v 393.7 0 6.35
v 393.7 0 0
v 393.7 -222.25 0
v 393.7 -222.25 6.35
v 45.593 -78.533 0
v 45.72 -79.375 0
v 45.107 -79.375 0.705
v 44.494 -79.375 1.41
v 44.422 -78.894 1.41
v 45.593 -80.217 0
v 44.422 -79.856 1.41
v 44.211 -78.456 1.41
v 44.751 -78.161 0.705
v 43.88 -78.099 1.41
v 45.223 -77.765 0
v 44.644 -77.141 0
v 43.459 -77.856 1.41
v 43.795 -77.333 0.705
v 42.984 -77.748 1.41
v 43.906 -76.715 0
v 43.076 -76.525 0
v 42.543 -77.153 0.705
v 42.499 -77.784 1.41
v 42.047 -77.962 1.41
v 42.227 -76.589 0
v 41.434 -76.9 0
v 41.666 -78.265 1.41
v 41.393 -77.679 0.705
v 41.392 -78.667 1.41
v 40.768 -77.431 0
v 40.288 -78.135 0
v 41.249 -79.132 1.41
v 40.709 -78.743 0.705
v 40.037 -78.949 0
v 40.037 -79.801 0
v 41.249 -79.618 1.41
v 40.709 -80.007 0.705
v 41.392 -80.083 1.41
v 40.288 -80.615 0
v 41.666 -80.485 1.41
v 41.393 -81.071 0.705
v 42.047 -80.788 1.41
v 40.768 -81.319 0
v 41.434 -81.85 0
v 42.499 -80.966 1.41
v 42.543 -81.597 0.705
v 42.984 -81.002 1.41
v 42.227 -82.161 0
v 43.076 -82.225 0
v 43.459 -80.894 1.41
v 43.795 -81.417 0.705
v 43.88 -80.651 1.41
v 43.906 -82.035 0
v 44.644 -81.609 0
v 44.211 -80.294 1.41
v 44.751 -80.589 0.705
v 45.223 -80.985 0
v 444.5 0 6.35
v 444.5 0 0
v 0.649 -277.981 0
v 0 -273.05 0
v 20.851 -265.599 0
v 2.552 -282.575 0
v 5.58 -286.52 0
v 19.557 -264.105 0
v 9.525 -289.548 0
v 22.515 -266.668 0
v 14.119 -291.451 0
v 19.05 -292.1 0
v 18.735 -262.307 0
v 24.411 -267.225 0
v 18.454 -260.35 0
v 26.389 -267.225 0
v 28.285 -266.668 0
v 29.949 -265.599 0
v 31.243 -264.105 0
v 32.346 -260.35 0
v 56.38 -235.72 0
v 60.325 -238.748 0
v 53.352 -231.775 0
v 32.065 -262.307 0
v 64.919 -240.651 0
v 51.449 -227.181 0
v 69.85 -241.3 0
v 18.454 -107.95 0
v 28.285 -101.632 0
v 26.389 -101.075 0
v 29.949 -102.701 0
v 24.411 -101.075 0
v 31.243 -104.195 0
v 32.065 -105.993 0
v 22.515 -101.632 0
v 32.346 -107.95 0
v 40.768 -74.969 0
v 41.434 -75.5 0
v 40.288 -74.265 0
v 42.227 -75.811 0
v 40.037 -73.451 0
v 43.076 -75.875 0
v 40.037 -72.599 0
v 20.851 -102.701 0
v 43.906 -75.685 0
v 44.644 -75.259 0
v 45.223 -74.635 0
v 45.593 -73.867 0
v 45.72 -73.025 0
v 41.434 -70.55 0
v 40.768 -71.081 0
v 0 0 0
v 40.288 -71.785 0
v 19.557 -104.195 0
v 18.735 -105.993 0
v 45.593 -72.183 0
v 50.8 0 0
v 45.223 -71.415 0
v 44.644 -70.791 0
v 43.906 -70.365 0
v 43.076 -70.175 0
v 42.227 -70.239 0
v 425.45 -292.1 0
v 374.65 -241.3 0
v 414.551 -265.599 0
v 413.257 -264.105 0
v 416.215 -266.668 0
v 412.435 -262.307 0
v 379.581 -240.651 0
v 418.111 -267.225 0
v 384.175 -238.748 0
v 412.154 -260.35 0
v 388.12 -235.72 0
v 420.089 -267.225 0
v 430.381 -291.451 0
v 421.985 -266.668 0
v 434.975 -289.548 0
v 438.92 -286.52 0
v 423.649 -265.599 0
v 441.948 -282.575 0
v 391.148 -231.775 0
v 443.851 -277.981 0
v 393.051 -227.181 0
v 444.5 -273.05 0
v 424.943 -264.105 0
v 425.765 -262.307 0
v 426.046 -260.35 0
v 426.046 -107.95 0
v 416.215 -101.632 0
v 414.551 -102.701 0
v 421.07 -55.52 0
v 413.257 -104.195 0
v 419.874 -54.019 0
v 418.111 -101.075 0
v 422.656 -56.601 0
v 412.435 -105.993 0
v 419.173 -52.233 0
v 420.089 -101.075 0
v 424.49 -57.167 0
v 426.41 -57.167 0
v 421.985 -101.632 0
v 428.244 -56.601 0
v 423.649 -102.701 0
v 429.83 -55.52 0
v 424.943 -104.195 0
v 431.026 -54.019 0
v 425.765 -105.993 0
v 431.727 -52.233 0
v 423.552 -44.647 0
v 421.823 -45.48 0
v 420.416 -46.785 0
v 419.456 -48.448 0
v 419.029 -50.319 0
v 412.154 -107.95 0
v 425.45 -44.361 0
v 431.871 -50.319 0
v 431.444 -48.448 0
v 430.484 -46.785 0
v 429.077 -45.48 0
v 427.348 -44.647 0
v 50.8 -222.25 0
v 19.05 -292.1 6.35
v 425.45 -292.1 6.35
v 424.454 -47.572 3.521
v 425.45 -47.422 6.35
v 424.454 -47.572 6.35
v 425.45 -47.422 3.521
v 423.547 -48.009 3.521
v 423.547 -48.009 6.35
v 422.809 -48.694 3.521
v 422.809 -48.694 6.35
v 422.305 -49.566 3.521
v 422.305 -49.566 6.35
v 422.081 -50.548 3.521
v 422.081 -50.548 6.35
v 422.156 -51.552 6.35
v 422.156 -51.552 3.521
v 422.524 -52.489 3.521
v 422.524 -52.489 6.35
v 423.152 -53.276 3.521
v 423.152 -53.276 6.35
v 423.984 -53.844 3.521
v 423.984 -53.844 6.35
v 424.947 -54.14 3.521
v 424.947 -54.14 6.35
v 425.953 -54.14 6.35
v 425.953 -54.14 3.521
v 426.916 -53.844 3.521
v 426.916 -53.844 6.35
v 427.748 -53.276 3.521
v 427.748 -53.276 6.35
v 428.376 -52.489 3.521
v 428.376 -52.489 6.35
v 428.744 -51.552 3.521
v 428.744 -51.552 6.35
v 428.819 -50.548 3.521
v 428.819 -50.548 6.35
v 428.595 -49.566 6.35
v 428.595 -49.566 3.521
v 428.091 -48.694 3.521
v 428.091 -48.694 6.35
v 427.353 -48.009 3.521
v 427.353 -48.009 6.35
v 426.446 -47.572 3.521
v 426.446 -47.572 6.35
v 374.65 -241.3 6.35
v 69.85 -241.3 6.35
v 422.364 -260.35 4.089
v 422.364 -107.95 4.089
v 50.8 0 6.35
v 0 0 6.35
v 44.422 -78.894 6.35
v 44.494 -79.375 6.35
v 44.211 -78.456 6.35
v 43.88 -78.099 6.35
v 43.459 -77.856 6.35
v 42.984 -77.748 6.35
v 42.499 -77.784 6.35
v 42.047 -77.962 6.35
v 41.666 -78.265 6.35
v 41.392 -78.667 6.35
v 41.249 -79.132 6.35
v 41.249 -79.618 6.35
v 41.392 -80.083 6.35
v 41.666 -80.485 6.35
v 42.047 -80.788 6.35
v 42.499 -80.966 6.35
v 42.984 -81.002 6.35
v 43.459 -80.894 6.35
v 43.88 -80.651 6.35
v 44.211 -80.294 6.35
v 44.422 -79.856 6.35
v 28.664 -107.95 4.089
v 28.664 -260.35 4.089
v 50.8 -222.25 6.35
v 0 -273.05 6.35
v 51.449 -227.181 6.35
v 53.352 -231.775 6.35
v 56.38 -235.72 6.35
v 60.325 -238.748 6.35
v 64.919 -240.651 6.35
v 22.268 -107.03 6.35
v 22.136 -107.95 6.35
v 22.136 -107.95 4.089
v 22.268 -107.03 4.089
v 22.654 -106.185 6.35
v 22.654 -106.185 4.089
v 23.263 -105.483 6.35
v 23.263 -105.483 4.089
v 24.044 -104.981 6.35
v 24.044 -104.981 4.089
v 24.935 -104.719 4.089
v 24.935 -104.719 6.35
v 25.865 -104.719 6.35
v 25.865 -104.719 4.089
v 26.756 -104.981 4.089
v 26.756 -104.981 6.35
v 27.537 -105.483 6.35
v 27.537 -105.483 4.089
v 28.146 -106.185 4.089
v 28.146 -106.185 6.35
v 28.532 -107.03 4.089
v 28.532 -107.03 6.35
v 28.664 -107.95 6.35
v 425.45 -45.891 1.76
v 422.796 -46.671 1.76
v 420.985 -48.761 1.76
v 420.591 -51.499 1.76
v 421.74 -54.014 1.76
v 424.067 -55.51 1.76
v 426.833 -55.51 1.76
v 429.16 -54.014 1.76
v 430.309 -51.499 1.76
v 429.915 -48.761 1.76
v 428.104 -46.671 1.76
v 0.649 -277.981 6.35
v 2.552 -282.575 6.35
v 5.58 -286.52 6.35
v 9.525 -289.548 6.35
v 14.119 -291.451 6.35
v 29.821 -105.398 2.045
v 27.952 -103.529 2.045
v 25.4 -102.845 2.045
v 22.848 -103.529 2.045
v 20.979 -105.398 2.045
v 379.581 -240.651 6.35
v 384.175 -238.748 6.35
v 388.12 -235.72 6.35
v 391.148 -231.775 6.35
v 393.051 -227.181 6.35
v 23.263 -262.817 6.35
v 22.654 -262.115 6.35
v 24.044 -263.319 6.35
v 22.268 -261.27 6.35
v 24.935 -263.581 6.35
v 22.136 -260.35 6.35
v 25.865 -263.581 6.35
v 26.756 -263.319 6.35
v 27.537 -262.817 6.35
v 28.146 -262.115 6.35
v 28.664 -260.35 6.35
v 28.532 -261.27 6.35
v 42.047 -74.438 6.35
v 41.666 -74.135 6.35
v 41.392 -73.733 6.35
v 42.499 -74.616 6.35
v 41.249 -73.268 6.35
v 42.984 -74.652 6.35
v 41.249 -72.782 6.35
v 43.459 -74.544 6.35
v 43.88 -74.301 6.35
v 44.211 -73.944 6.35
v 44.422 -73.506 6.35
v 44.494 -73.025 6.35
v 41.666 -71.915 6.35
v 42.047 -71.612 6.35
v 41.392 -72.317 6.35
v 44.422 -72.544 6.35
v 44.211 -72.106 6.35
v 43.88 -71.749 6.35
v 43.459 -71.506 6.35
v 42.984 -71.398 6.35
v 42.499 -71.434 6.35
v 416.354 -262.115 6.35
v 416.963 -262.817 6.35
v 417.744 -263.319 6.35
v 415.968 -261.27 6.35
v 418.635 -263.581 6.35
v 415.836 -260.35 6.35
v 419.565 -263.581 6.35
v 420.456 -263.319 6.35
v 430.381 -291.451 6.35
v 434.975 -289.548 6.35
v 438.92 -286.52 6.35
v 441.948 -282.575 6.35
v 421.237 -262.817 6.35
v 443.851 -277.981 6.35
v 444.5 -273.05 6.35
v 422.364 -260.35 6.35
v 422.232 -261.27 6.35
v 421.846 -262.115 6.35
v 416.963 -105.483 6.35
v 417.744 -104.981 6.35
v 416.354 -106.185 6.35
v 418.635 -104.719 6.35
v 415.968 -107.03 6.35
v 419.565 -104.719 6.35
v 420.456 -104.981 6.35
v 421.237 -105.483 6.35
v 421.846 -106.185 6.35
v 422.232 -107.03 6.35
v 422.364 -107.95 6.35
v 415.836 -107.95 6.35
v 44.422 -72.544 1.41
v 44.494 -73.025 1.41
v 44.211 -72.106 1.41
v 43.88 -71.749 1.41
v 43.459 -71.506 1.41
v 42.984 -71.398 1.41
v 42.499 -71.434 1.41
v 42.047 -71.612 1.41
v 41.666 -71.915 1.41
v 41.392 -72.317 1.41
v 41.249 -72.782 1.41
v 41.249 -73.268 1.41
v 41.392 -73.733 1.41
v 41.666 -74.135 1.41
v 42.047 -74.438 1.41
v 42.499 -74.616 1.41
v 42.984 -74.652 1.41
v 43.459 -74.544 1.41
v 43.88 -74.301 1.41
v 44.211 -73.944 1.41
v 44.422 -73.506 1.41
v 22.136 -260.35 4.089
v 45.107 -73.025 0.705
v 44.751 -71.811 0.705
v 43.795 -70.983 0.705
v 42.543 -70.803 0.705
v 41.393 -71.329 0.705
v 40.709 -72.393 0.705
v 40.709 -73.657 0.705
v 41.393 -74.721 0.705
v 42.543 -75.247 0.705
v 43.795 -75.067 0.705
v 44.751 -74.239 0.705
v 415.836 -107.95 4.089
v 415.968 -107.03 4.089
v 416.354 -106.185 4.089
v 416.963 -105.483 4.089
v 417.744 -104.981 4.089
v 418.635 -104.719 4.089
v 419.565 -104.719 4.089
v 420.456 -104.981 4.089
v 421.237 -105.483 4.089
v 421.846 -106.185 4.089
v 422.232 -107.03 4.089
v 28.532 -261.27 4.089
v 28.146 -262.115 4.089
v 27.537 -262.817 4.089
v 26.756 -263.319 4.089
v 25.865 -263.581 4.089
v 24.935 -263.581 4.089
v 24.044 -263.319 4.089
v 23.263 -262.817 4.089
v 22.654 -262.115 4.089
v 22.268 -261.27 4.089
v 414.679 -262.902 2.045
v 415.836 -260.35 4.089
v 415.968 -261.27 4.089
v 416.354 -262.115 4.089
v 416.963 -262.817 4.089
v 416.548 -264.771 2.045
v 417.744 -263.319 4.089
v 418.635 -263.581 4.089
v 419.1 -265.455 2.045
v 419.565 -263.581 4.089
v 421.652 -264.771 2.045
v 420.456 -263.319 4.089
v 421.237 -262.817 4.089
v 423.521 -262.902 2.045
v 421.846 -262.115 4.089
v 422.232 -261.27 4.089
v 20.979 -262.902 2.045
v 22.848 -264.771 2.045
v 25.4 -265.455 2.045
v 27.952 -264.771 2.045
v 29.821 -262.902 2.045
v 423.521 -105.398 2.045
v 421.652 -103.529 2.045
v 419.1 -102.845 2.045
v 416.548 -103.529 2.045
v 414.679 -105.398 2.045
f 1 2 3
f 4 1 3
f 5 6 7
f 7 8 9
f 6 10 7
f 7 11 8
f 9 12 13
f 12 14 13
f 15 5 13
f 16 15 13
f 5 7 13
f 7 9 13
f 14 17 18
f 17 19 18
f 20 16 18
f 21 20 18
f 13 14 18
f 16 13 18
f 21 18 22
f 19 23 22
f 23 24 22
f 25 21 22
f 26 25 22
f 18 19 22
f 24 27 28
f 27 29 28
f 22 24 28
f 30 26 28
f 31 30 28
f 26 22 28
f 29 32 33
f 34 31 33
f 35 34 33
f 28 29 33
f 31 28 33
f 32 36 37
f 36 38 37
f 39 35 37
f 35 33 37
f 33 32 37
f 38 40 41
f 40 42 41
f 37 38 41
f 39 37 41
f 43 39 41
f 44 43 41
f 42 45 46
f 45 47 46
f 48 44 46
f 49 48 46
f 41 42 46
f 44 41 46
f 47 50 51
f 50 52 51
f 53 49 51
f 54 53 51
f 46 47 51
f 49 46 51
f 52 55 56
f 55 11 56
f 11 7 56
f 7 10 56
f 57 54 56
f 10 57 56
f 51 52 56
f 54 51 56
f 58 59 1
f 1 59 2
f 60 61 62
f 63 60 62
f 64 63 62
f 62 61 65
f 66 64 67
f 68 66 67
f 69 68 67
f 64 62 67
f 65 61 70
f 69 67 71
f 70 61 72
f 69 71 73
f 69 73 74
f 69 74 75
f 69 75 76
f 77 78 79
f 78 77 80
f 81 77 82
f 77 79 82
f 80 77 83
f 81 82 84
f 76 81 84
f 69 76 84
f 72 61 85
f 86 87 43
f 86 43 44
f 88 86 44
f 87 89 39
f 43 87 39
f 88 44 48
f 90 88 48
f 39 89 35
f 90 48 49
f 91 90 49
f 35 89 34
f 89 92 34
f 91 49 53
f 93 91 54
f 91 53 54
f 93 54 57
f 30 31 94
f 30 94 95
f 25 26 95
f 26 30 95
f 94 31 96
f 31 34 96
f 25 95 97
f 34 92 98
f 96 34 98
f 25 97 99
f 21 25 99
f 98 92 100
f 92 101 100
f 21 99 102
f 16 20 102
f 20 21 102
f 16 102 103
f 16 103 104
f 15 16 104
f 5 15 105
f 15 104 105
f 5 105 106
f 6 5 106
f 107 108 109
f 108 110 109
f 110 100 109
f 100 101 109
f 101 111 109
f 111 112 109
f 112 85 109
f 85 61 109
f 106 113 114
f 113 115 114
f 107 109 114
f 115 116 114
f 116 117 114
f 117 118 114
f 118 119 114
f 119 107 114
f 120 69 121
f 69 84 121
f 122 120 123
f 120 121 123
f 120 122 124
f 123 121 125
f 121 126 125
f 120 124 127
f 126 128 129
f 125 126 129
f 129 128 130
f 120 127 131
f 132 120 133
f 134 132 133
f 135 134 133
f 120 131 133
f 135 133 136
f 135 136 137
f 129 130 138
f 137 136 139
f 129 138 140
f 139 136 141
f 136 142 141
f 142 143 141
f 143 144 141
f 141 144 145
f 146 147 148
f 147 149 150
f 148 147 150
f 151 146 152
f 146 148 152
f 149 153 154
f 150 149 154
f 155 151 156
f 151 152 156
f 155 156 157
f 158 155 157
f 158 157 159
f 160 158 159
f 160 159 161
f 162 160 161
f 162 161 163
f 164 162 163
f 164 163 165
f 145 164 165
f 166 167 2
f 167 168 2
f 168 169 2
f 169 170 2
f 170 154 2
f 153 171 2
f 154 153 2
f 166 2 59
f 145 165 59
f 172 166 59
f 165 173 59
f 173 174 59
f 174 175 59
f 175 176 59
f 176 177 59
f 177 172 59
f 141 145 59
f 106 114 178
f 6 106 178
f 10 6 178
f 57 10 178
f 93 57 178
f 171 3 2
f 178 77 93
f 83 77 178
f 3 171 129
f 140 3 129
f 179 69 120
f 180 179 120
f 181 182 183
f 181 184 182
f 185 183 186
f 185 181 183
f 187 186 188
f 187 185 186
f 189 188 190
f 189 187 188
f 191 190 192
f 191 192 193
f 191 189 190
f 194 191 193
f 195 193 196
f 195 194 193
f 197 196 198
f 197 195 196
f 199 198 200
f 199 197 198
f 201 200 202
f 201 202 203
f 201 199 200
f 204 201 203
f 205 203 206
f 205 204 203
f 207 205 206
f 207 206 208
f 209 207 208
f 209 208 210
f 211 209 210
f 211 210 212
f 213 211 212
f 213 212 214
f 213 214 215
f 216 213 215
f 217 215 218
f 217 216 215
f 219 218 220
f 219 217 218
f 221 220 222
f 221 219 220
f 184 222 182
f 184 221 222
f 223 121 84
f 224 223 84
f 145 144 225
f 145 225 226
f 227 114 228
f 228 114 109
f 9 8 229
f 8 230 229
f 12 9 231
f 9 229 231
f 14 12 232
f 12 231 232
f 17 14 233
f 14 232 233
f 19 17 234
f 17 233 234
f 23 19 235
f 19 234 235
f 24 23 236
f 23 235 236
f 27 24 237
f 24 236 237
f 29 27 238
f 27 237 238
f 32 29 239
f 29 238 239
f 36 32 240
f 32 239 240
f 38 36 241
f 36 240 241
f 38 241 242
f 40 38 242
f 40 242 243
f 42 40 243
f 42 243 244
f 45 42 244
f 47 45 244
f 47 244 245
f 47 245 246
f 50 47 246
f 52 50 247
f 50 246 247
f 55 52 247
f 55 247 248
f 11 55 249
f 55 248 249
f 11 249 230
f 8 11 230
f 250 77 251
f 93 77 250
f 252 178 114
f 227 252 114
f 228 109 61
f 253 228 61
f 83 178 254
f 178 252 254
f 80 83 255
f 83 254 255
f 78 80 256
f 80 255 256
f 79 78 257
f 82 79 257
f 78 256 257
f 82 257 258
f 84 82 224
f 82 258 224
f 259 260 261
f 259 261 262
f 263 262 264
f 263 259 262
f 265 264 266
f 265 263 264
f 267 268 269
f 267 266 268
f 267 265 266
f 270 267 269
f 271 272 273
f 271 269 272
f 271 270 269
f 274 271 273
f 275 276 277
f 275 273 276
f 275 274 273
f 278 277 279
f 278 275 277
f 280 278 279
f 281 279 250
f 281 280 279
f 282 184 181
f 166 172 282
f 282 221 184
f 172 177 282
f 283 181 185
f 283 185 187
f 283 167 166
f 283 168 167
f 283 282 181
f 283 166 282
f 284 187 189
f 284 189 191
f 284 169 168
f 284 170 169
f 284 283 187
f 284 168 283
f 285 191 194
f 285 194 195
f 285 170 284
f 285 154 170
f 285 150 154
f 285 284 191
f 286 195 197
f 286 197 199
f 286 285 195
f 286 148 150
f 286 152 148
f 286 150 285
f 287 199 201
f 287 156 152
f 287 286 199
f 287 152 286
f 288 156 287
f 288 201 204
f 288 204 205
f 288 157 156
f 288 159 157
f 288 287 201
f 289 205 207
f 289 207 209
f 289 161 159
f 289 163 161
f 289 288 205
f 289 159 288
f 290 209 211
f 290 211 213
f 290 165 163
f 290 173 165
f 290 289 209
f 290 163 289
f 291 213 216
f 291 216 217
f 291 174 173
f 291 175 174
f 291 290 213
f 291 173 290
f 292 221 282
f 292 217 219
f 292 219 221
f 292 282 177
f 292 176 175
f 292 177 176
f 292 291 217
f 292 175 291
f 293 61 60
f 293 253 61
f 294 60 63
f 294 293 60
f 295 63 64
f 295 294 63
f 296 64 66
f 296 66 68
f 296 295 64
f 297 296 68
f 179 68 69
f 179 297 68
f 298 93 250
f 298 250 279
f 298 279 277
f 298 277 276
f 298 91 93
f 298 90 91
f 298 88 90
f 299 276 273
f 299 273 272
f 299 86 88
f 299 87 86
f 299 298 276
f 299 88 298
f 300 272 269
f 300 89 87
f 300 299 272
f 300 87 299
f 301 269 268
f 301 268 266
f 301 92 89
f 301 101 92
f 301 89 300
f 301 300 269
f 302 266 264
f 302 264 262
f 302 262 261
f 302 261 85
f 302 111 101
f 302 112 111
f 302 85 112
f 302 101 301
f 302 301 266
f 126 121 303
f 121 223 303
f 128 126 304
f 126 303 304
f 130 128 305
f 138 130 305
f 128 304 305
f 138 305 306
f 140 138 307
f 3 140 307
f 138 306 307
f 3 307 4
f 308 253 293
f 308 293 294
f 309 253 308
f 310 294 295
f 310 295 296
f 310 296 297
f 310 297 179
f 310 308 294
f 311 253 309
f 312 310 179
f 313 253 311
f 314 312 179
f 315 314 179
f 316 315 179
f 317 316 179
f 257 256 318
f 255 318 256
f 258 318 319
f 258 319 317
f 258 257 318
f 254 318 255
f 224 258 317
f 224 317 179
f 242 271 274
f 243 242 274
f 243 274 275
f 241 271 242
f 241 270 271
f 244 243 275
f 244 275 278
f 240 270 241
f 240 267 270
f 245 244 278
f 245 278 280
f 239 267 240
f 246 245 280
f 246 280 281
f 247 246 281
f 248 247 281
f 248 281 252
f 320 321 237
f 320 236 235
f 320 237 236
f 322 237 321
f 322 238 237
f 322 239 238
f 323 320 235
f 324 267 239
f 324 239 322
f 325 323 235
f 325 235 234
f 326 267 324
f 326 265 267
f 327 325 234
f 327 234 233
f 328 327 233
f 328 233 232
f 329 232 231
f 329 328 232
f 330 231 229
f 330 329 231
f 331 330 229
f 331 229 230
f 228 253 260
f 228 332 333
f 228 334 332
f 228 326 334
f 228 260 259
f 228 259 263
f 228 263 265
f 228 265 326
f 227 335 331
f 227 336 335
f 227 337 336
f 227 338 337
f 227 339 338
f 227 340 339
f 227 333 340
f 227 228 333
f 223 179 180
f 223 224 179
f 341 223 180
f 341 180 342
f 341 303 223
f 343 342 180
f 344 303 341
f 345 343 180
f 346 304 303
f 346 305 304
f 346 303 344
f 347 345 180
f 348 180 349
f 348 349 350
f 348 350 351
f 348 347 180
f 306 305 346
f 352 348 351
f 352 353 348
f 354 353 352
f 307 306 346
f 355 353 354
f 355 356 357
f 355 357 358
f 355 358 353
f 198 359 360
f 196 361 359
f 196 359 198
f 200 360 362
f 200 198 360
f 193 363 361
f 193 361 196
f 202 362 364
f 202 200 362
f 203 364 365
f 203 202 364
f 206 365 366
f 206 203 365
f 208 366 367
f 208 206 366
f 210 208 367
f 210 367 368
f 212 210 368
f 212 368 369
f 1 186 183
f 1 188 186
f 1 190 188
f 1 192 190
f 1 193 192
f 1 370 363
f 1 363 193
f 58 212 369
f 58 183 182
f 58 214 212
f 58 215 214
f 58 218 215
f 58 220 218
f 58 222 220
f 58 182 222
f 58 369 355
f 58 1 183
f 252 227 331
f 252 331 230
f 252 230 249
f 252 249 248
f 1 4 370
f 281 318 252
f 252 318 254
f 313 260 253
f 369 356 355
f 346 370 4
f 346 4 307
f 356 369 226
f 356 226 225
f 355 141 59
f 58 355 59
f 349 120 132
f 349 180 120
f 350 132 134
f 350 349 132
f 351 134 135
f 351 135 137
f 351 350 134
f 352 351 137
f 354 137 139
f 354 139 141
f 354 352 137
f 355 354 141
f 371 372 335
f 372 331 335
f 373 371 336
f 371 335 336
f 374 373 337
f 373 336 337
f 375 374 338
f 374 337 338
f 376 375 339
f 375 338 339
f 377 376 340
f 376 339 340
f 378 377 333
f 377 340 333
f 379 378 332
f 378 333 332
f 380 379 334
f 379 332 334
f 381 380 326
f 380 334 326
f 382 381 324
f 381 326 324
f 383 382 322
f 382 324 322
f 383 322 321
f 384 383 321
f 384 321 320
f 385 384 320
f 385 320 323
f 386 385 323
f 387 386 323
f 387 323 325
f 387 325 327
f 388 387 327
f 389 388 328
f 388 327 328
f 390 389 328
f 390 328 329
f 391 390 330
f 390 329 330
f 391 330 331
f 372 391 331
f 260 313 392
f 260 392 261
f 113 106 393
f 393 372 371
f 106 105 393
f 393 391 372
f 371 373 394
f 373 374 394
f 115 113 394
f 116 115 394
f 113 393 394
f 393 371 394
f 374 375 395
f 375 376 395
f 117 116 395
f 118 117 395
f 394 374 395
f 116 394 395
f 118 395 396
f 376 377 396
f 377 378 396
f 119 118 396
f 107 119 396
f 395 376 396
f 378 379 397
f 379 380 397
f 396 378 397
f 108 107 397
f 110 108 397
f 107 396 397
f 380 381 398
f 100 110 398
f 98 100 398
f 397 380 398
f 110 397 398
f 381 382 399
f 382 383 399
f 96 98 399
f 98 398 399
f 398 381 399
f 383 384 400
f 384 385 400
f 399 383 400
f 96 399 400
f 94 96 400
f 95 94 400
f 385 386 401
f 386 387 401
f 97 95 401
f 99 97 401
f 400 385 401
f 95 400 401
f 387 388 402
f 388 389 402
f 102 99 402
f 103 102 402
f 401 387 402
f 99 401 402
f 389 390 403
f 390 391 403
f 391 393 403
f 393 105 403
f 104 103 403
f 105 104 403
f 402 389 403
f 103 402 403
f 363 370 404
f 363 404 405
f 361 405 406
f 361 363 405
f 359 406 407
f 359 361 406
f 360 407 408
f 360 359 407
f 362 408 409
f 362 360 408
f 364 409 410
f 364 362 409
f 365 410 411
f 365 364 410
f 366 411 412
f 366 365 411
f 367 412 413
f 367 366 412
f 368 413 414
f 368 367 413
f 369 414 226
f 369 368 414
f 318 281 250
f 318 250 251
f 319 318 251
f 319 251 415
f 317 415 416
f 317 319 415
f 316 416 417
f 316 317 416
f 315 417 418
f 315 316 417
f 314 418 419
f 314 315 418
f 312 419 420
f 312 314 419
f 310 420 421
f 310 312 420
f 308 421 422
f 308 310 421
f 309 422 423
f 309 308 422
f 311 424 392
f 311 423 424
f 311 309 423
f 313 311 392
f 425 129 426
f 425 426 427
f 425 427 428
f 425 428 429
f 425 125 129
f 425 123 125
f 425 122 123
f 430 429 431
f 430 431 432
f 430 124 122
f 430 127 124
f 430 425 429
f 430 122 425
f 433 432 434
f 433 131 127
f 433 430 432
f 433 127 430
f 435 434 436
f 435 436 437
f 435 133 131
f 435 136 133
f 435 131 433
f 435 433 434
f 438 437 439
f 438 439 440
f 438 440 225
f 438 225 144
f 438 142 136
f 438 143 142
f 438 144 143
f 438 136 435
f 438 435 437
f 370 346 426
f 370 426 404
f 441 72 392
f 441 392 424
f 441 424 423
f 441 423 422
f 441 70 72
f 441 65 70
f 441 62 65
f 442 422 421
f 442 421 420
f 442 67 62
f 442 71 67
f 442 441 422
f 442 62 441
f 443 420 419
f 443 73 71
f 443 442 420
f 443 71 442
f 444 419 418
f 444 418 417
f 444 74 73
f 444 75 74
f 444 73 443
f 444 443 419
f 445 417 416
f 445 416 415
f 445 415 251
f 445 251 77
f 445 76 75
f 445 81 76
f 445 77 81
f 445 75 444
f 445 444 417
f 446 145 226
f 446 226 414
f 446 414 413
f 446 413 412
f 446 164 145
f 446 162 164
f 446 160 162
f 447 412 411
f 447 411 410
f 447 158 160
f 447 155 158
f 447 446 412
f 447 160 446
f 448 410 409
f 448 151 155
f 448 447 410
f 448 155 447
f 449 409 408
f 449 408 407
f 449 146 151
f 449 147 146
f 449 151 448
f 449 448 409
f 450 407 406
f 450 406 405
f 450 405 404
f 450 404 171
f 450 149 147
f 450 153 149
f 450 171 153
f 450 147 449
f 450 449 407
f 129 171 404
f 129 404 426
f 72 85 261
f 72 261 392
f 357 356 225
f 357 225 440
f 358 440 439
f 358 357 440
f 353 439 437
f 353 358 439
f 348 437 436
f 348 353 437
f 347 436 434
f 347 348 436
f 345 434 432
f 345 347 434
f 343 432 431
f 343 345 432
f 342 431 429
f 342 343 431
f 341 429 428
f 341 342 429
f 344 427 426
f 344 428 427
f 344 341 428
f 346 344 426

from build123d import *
from OCP.BRepFilletAPI import BRepFilletAPI_MakeChamfer

# Parameters (mm, degrees)
BOSS_EXTRUDE1_DEPTH                            = 6.35
FILLET5_R                                      = 19.05
FILLET6_R                                      = 19.05
FILLET7_R                                      = 19.05
FILLET8_R                                      = 19.05
CUT_EXTRUDE1_DEPTH                             = 532.923850283
CUT_EXTRUDE2_DEPTH                             = 532.923850283
CHAMFER1_SIZE                                  = 4.0894
CHAMFER1_SIZE2                                 = 3.682112299
CHAMFER2_SIZE                                  = 4.0894
CHAMFER2_SIZE2                                 = 3.682112299
F_62_0_038_DIAMETER_HOLE1_D                    = 0.9652
F_62_0_038_DIAMETER_HOLE1_DEPTH                = 25.4
F_62_0_038_DIAMETER_HOLE1_TIP                  = 0.289975335
CSK_FOR_4_FLAT_HEAD_MACHINE_SCREW3_D           = 3.2639
CSK_FOR_4_FLAT_HEAD_MACHINE_SCREW3_CSINK_D     = 5.715
CSK_FOR_4_FLAT_HEAD_MACHINE_SCREW3_CSINK_ANGLE = 82


with BuildPart() as part:
    # Sketch1 → Boss-Extrude1 (new body)
    with BuildSketch(Plane.XY):
        Polygon((0, 0), (0, -292.1), (444.5, -292.1), (444.5, 0), (393.7, 0), (393.7, -241.3), (50.8, -241.3), (50.8, 0), align=None)
    extrude(amount=BOSS_EXTRUDE1_DEPTH)

    # Fillet5
    fillet5_edges = [part.edges().sort_by_distance(p)[0] for p in [
        (0, -292.1, 3.175),
    ]]
    fillet(fillet5_edges, radius=FILLET5_R)

    # Fillet6
    fillet6_edges = [part.edges().sort_by_distance(p)[0] for p in [
        (444.5, -292.1, 3.175),
    ]]
    fillet(fillet6_edges, radius=FILLET6_R)

    # Fillet7
    fillet7_edges = [part.edges().sort_by_distance(p)[0] for p in [
        (50.8, -241.3, 3.175),
    ]]
    fillet(fillet7_edges, radius=FILLET7_R)

    # Fillet8
    fillet8_edges = [part.edges().sort_by_distance(p)[0] for p in [
        (393.7, -241.3, 3.175),
    ]]
    fillet(fillet8_edges, radius=FILLET8_R)

    # Sketch2 → Cut-Extrude1 (cut, through all)
    with BuildSketch(Plane.XY.offset(6.35)):
        with BuildLine():
            Line((422.3639, -107.95), (422.3639, -260.35))
            ThreePointArc((422.3639, -260.35), (419.1, -263.6139), (415.8361, -260.35))
            Line((415.8361, -260.35), (415.8361, -107.95))
            ThreePointArc((415.8361, -107.95), (419.1, -104.6861), (422.3639, -107.95))
        make_face()
    extrude(amount=-CUT_EXTRUDE1_DEPTH, mode=Mode.SUBTRACT)

    # Sketch3 → Cut-Extrude2 (cut, through all)
    with BuildSketch(Plane.XY.offset(6.35)):
        with BuildLine():
            Line((28.6639, -107.95), (28.6639, -260.35))
            ThreePointArc((28.6639, -260.35), (25.4, -263.6139), (22.1361, -260.35))
            Line((22.1361, -260.35), (22.1361, -107.95))
            ThreePointArc((22.1361, -107.95), (25.4, -104.6861), (28.6639, -107.95))
        make_face()
    extrude(amount=-CUT_EXTRUDE2_DEPTH, mode=Mode.SUBTRACT)

    # Sketch4 → CSK for 1/4 Flat Head Machine Screw1 (revolve, cut)
    with BuildSketch(Plane(origin=(425.45, -50.8, 0), x_dir=(0, 1, 0), z_dir=(1, 0, 0))):
        Polygon((0, 0), (0, 6.35), (3.3782, 6.35), (3.3782, 3.520932584), (6.4389, 0), align=None)
    revolve(axis=Axis((425.45, -50.8, -6.35), (0, 0, 1)), mode=Mode.SUBTRACT)

    # Chamfer1: one chamfer whose edges measure the first distance from different faces: ONE call of the kernel's chamfer builder (chamfer() names one face for all edges)
    chamfer1_edges_1 = [part.edges().sort_by_distance(p)[0] for p in [
        (25.4, -104.6861, 0),
    ]]
    chamfer1_side_1 = [part.faces().sort_by_distance(p)[0] for p in [
        (25.4, -104.6861, 3.175),
    ]]
    chamfer1_edges_2 = [part.edges().sort_by_distance(p)[0] for p in [
        (28.6639, -184.15, 0),
    ]]
    chamfer1_side_2 = [part.faces().sort_by_distance(p)[0] for p in [
        (28.6639, -184.15, 3.175),
    ]]
    chamfer1_edges_3 = [part.edges().sort_by_distance(p)[0] for p in [
        (25.4, -263.6139, 0),
    ]]
    chamfer1_side_3 = [part.faces().sort_by_distance(p)[0] for p in [
        (25.4, -263.6139, 3.175),
    ]]
    chamfer1_edges_4 = [part.edges().sort_by_distance(p)[0] for p in [
        (22.1361, -184.15, 0),
    ]]
    chamfer1_side_4 = [part.faces().sort_by_distance(p)[0] for p in [
        (22.1361, -184.15, 3.175),
    ]]
    chamfer1 = BRepFilletAPI_MakeChamfer(part.part.solid().wrapped)
    for e in chamfer1_edges_1:
        chamfer1.Add(CHAMFER1_SIZE, CHAMFER1_SIZE2, e.wrapped, chamfer1_side_1[0].wrapped)  # the first distance lies on this face
    for e in chamfer1_edges_2:
        chamfer1.Add(CHAMFER1_SIZE, CHAMFER1_SIZE2, e.wrapped, chamfer1_side_2[0].wrapped)  # the first distance lies on this face
    for e in chamfer1_edges_3:
        chamfer1.Add(CHAMFER1_SIZE, CHAMFER1_SIZE2, e.wrapped, chamfer1_side_3[0].wrapped)  # the first distance lies on this face
    for e in chamfer1_edges_4:
        chamfer1.Add(CHAMFER1_SIZE, CHAMFER1_SIZE2, e.wrapped, chamfer1_side_4[0].wrapped)  # the first distance lies on this face
    add(Compound.cast(chamfer1.Shape()), mode=Mode.REPLACE)

    # Chamfer2: one chamfer whose edges measure the first distance from different faces: ONE call of the kernel's chamfer builder (chamfer() names one face for all edges)
    chamfer2_edges_1 = [part.edges().sort_by_distance(p)[0] for p in [
        (419.1, -104.6861, 0),
    ]]
    chamfer2_side_1 = [part.faces().sort_by_distance(p)[0] for p in [
        (419.1, -104.6861, 3.175),
    ]]
    chamfer2_edges_2 = [part.edges().sort_by_distance(p)[0] for p in [
        (422.3639, -184.15, 0),
    ]]
    chamfer2_side_2 = [part.faces().sort_by_distance(p)[0] for p in [
        (422.3639, -184.15, 3.175),
    ]]
    chamfer2_edges_3 = [part.edges().sort_by_distance(p)[0] for p in [
        (419.1, -263.6139, 0),
    ]]
    chamfer2_side_3 = [part.faces().sort_by_distance(p)[0] for p in [
        (419.1, -263.6139, 3.175),
    ]]
    chamfer2_edges_4 = [part.edges().sort_by_distance(p)[0] for p in [
        (415.8361, -184.15, 0),
    ]]
    chamfer2_side_4 = [part.faces().sort_by_distance(p)[0] for p in [
        (415.8361, -184.15, 3.175),
    ]]
    chamfer2 = BRepFilletAPI_MakeChamfer(part.part.solid().wrapped)
    for e in chamfer2_edges_1:
        chamfer2.Add(CHAMFER2_SIZE, CHAMFER2_SIZE2, e.wrapped, chamfer2_side_1[0].wrapped)  # the first distance lies on this face
    for e in chamfer2_edges_2:
        chamfer2.Add(CHAMFER2_SIZE, CHAMFER2_SIZE2, e.wrapped, chamfer2_side_2[0].wrapped)  # the first distance lies on this face
    for e in chamfer2_edges_3:
        chamfer2.Add(CHAMFER2_SIZE, CHAMFER2_SIZE2, e.wrapped, chamfer2_side_3[0].wrapped)  # the first distance lies on this face
    for e in chamfer2_edges_4:
        chamfer2.Add(CHAMFER2_SIZE, CHAMFER2_SIZE2, e.wrapped, chamfer2_side_4[0].wrapped)  # the first distance lies on this face
    add(Compound.cast(chamfer2.Shape()), mode=Mode.REPLACE)

    # #62 (0.038) Diameter Hole1
    with Locations(Plane.XY.offset(6.35)):
        with Locations((42.8625, -73.025), (42.8625, -79.375)):
            Hole(F_62_0_038_DIAMETER_HOLE1_D / 2, depth=F_62_0_038_DIAMETER_HOLE1_DEPTH)
            with Locations((0, 0, -(F_62_0_038_DIAMETER_HOLE1_DEPTH + F_62_0_038_DIAMETER_HOLE1_TIP / 2))):  # 118° drill point
                Cone(0, F_62_0_038_DIAMETER_HOLE1_D / 2, F_62_0_038_DIAMETER_HOLE1_TIP, mode=Mode.SUBTRACT)

    # CSK for #4 Flat Head Machine Screw3 (through all)
    with Locations(Plane(origin=(0, 0, 0), x_dir=(-1, 0, 0), z_dir=(0, 0, -1))):
        with Locations((-42.8625, -79.375), (-42.8625, -73.025)):
            CounterSinkHole(CSK_FOR_4_FLAT_HEAD_MACHINE_SCREW3_D / 2, CSK_FOR_4_FLAT_HEAD_MACHINE_SCREW3_CSINK_D / 2, counter_sink_angle=CSK_FOR_4_FLAT_HEAD_MACHINE_SCREW3_CSINK_ANGLE)


solid = part.part
